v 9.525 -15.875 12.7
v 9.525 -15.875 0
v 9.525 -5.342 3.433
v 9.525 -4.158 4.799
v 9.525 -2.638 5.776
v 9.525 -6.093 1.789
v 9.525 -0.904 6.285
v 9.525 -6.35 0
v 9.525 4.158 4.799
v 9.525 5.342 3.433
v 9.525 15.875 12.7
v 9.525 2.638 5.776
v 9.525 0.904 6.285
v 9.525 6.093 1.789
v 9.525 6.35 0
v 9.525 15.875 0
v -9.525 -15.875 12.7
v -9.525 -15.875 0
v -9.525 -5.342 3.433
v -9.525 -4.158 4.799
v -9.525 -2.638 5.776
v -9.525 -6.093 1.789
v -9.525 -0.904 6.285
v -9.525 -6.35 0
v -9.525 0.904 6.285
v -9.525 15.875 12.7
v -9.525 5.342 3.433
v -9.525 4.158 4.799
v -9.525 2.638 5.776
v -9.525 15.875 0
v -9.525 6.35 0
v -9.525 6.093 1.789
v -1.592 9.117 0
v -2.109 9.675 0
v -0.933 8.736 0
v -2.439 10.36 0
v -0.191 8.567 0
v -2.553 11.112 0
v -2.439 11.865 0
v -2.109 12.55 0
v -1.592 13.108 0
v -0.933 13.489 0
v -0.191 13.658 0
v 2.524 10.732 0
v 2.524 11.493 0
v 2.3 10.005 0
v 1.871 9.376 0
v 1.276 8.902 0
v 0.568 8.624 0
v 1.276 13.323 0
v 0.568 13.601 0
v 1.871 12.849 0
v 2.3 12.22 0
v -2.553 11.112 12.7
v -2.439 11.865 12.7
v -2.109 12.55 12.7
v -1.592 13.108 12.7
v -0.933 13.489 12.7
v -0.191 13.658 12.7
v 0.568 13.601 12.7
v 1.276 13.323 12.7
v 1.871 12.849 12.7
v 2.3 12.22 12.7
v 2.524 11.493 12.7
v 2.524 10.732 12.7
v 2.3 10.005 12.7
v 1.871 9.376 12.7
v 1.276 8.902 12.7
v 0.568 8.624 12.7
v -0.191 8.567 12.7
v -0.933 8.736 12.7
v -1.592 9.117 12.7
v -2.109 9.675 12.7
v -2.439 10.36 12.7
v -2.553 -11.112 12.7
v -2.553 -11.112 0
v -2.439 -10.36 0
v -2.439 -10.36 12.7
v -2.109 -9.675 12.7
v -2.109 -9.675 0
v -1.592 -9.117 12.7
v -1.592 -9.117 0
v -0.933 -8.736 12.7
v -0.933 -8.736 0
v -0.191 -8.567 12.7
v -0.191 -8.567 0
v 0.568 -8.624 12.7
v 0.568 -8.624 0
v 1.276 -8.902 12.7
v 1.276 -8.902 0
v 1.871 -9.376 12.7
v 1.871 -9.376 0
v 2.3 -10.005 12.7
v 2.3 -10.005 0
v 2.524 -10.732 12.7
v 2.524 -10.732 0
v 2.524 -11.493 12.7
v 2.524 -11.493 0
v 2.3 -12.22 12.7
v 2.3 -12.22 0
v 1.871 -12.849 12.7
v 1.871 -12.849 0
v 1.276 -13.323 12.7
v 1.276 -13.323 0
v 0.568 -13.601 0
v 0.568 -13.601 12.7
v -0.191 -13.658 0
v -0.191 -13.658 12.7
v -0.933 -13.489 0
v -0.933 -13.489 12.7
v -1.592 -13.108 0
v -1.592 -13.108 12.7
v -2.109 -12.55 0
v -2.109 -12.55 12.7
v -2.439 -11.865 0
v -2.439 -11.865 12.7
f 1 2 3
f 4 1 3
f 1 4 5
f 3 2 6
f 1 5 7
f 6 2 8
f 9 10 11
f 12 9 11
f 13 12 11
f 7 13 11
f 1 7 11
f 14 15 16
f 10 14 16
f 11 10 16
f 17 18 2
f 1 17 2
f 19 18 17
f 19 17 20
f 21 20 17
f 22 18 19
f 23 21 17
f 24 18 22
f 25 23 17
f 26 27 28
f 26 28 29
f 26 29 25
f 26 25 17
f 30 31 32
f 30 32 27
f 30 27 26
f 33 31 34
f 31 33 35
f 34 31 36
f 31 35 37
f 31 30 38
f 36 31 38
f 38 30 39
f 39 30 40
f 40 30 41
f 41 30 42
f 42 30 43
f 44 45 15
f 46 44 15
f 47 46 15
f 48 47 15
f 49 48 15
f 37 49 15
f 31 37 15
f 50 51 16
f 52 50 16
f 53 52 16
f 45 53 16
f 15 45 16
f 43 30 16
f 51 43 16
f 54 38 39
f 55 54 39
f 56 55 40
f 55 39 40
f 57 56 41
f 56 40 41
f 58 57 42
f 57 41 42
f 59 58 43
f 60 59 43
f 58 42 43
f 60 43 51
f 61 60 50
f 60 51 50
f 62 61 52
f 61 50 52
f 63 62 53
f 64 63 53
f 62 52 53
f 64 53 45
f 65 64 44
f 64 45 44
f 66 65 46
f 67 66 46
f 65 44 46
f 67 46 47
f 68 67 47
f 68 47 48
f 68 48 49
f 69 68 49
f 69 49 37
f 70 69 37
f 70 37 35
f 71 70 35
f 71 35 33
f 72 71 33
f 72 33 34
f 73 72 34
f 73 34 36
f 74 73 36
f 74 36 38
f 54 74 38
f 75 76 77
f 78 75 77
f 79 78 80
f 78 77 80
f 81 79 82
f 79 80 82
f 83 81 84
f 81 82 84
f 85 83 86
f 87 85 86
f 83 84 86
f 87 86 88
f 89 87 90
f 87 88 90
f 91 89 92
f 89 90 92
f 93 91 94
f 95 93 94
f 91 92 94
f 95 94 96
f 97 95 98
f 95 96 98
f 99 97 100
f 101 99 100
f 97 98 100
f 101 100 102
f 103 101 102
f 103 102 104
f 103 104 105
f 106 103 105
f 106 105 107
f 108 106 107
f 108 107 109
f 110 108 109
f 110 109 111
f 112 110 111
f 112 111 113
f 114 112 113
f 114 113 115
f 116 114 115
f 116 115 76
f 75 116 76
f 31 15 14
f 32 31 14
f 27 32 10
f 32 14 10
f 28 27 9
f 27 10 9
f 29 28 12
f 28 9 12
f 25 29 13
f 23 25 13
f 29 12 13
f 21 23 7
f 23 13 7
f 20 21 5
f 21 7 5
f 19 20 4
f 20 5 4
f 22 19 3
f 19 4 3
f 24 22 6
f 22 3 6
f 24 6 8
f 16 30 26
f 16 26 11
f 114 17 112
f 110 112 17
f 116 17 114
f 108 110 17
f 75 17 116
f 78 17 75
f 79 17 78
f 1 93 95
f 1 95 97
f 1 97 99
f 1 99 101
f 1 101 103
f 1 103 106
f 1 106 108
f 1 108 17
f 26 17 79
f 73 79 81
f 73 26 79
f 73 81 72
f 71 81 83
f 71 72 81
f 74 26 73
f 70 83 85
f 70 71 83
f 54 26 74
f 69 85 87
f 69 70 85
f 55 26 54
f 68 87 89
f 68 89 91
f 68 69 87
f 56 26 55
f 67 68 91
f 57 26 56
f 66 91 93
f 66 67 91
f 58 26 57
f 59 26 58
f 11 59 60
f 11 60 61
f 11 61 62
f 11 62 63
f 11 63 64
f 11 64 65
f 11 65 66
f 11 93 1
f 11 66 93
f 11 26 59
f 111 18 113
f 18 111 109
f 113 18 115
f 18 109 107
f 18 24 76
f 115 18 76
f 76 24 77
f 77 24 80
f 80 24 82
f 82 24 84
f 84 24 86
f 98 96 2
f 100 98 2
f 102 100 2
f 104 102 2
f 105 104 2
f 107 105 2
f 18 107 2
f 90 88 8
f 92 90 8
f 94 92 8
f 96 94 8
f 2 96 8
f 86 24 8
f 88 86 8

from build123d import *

# Parameters (mm, degrees)
SKETCH1_W               = 19.05
SKETCH1_H               = 31.75
BOSS_EXTRUDE1_DEPTH     = 12.7
SKETCH2_R               = 6.35
CUT_EXTRUDE1_DEPTH      = 28.86051193
F_1_4_20_TAPPED_HOLE1_D = 5.1054


with BuildPart() as part:
    # Sketch1 → Boss-Extrude1 (new body)
    with BuildSketch(Plane.XY):
        Rectangle(SKETCH1_W, SKETCH1_H)
    extrude(amount=BOSS_EXTRUDE1_DEPTH)

    # Sketch2 → Cut-Extrude1 (cut, through all)
    with BuildSketch(Plane(origin=(9.525, 0, 0), x_dir=(0, 0, -1), z_dir=(1, 0, 0))):
        Circle(SKETCH2_R)
    extrude(amount=-CUT_EXTRUDE1_DEPTH, mode=Mode.SUBTRACT)

    # 1/4-20 Tapped Hole1 (through all)
    with Locations(Plane.XY.offset(12.7)):
        with Locations((0, 11.1125), (0, -11.1125)):
            Hole(F_1_4_20_TAPPED_HOLE1_D / 2)


solid = part.part
